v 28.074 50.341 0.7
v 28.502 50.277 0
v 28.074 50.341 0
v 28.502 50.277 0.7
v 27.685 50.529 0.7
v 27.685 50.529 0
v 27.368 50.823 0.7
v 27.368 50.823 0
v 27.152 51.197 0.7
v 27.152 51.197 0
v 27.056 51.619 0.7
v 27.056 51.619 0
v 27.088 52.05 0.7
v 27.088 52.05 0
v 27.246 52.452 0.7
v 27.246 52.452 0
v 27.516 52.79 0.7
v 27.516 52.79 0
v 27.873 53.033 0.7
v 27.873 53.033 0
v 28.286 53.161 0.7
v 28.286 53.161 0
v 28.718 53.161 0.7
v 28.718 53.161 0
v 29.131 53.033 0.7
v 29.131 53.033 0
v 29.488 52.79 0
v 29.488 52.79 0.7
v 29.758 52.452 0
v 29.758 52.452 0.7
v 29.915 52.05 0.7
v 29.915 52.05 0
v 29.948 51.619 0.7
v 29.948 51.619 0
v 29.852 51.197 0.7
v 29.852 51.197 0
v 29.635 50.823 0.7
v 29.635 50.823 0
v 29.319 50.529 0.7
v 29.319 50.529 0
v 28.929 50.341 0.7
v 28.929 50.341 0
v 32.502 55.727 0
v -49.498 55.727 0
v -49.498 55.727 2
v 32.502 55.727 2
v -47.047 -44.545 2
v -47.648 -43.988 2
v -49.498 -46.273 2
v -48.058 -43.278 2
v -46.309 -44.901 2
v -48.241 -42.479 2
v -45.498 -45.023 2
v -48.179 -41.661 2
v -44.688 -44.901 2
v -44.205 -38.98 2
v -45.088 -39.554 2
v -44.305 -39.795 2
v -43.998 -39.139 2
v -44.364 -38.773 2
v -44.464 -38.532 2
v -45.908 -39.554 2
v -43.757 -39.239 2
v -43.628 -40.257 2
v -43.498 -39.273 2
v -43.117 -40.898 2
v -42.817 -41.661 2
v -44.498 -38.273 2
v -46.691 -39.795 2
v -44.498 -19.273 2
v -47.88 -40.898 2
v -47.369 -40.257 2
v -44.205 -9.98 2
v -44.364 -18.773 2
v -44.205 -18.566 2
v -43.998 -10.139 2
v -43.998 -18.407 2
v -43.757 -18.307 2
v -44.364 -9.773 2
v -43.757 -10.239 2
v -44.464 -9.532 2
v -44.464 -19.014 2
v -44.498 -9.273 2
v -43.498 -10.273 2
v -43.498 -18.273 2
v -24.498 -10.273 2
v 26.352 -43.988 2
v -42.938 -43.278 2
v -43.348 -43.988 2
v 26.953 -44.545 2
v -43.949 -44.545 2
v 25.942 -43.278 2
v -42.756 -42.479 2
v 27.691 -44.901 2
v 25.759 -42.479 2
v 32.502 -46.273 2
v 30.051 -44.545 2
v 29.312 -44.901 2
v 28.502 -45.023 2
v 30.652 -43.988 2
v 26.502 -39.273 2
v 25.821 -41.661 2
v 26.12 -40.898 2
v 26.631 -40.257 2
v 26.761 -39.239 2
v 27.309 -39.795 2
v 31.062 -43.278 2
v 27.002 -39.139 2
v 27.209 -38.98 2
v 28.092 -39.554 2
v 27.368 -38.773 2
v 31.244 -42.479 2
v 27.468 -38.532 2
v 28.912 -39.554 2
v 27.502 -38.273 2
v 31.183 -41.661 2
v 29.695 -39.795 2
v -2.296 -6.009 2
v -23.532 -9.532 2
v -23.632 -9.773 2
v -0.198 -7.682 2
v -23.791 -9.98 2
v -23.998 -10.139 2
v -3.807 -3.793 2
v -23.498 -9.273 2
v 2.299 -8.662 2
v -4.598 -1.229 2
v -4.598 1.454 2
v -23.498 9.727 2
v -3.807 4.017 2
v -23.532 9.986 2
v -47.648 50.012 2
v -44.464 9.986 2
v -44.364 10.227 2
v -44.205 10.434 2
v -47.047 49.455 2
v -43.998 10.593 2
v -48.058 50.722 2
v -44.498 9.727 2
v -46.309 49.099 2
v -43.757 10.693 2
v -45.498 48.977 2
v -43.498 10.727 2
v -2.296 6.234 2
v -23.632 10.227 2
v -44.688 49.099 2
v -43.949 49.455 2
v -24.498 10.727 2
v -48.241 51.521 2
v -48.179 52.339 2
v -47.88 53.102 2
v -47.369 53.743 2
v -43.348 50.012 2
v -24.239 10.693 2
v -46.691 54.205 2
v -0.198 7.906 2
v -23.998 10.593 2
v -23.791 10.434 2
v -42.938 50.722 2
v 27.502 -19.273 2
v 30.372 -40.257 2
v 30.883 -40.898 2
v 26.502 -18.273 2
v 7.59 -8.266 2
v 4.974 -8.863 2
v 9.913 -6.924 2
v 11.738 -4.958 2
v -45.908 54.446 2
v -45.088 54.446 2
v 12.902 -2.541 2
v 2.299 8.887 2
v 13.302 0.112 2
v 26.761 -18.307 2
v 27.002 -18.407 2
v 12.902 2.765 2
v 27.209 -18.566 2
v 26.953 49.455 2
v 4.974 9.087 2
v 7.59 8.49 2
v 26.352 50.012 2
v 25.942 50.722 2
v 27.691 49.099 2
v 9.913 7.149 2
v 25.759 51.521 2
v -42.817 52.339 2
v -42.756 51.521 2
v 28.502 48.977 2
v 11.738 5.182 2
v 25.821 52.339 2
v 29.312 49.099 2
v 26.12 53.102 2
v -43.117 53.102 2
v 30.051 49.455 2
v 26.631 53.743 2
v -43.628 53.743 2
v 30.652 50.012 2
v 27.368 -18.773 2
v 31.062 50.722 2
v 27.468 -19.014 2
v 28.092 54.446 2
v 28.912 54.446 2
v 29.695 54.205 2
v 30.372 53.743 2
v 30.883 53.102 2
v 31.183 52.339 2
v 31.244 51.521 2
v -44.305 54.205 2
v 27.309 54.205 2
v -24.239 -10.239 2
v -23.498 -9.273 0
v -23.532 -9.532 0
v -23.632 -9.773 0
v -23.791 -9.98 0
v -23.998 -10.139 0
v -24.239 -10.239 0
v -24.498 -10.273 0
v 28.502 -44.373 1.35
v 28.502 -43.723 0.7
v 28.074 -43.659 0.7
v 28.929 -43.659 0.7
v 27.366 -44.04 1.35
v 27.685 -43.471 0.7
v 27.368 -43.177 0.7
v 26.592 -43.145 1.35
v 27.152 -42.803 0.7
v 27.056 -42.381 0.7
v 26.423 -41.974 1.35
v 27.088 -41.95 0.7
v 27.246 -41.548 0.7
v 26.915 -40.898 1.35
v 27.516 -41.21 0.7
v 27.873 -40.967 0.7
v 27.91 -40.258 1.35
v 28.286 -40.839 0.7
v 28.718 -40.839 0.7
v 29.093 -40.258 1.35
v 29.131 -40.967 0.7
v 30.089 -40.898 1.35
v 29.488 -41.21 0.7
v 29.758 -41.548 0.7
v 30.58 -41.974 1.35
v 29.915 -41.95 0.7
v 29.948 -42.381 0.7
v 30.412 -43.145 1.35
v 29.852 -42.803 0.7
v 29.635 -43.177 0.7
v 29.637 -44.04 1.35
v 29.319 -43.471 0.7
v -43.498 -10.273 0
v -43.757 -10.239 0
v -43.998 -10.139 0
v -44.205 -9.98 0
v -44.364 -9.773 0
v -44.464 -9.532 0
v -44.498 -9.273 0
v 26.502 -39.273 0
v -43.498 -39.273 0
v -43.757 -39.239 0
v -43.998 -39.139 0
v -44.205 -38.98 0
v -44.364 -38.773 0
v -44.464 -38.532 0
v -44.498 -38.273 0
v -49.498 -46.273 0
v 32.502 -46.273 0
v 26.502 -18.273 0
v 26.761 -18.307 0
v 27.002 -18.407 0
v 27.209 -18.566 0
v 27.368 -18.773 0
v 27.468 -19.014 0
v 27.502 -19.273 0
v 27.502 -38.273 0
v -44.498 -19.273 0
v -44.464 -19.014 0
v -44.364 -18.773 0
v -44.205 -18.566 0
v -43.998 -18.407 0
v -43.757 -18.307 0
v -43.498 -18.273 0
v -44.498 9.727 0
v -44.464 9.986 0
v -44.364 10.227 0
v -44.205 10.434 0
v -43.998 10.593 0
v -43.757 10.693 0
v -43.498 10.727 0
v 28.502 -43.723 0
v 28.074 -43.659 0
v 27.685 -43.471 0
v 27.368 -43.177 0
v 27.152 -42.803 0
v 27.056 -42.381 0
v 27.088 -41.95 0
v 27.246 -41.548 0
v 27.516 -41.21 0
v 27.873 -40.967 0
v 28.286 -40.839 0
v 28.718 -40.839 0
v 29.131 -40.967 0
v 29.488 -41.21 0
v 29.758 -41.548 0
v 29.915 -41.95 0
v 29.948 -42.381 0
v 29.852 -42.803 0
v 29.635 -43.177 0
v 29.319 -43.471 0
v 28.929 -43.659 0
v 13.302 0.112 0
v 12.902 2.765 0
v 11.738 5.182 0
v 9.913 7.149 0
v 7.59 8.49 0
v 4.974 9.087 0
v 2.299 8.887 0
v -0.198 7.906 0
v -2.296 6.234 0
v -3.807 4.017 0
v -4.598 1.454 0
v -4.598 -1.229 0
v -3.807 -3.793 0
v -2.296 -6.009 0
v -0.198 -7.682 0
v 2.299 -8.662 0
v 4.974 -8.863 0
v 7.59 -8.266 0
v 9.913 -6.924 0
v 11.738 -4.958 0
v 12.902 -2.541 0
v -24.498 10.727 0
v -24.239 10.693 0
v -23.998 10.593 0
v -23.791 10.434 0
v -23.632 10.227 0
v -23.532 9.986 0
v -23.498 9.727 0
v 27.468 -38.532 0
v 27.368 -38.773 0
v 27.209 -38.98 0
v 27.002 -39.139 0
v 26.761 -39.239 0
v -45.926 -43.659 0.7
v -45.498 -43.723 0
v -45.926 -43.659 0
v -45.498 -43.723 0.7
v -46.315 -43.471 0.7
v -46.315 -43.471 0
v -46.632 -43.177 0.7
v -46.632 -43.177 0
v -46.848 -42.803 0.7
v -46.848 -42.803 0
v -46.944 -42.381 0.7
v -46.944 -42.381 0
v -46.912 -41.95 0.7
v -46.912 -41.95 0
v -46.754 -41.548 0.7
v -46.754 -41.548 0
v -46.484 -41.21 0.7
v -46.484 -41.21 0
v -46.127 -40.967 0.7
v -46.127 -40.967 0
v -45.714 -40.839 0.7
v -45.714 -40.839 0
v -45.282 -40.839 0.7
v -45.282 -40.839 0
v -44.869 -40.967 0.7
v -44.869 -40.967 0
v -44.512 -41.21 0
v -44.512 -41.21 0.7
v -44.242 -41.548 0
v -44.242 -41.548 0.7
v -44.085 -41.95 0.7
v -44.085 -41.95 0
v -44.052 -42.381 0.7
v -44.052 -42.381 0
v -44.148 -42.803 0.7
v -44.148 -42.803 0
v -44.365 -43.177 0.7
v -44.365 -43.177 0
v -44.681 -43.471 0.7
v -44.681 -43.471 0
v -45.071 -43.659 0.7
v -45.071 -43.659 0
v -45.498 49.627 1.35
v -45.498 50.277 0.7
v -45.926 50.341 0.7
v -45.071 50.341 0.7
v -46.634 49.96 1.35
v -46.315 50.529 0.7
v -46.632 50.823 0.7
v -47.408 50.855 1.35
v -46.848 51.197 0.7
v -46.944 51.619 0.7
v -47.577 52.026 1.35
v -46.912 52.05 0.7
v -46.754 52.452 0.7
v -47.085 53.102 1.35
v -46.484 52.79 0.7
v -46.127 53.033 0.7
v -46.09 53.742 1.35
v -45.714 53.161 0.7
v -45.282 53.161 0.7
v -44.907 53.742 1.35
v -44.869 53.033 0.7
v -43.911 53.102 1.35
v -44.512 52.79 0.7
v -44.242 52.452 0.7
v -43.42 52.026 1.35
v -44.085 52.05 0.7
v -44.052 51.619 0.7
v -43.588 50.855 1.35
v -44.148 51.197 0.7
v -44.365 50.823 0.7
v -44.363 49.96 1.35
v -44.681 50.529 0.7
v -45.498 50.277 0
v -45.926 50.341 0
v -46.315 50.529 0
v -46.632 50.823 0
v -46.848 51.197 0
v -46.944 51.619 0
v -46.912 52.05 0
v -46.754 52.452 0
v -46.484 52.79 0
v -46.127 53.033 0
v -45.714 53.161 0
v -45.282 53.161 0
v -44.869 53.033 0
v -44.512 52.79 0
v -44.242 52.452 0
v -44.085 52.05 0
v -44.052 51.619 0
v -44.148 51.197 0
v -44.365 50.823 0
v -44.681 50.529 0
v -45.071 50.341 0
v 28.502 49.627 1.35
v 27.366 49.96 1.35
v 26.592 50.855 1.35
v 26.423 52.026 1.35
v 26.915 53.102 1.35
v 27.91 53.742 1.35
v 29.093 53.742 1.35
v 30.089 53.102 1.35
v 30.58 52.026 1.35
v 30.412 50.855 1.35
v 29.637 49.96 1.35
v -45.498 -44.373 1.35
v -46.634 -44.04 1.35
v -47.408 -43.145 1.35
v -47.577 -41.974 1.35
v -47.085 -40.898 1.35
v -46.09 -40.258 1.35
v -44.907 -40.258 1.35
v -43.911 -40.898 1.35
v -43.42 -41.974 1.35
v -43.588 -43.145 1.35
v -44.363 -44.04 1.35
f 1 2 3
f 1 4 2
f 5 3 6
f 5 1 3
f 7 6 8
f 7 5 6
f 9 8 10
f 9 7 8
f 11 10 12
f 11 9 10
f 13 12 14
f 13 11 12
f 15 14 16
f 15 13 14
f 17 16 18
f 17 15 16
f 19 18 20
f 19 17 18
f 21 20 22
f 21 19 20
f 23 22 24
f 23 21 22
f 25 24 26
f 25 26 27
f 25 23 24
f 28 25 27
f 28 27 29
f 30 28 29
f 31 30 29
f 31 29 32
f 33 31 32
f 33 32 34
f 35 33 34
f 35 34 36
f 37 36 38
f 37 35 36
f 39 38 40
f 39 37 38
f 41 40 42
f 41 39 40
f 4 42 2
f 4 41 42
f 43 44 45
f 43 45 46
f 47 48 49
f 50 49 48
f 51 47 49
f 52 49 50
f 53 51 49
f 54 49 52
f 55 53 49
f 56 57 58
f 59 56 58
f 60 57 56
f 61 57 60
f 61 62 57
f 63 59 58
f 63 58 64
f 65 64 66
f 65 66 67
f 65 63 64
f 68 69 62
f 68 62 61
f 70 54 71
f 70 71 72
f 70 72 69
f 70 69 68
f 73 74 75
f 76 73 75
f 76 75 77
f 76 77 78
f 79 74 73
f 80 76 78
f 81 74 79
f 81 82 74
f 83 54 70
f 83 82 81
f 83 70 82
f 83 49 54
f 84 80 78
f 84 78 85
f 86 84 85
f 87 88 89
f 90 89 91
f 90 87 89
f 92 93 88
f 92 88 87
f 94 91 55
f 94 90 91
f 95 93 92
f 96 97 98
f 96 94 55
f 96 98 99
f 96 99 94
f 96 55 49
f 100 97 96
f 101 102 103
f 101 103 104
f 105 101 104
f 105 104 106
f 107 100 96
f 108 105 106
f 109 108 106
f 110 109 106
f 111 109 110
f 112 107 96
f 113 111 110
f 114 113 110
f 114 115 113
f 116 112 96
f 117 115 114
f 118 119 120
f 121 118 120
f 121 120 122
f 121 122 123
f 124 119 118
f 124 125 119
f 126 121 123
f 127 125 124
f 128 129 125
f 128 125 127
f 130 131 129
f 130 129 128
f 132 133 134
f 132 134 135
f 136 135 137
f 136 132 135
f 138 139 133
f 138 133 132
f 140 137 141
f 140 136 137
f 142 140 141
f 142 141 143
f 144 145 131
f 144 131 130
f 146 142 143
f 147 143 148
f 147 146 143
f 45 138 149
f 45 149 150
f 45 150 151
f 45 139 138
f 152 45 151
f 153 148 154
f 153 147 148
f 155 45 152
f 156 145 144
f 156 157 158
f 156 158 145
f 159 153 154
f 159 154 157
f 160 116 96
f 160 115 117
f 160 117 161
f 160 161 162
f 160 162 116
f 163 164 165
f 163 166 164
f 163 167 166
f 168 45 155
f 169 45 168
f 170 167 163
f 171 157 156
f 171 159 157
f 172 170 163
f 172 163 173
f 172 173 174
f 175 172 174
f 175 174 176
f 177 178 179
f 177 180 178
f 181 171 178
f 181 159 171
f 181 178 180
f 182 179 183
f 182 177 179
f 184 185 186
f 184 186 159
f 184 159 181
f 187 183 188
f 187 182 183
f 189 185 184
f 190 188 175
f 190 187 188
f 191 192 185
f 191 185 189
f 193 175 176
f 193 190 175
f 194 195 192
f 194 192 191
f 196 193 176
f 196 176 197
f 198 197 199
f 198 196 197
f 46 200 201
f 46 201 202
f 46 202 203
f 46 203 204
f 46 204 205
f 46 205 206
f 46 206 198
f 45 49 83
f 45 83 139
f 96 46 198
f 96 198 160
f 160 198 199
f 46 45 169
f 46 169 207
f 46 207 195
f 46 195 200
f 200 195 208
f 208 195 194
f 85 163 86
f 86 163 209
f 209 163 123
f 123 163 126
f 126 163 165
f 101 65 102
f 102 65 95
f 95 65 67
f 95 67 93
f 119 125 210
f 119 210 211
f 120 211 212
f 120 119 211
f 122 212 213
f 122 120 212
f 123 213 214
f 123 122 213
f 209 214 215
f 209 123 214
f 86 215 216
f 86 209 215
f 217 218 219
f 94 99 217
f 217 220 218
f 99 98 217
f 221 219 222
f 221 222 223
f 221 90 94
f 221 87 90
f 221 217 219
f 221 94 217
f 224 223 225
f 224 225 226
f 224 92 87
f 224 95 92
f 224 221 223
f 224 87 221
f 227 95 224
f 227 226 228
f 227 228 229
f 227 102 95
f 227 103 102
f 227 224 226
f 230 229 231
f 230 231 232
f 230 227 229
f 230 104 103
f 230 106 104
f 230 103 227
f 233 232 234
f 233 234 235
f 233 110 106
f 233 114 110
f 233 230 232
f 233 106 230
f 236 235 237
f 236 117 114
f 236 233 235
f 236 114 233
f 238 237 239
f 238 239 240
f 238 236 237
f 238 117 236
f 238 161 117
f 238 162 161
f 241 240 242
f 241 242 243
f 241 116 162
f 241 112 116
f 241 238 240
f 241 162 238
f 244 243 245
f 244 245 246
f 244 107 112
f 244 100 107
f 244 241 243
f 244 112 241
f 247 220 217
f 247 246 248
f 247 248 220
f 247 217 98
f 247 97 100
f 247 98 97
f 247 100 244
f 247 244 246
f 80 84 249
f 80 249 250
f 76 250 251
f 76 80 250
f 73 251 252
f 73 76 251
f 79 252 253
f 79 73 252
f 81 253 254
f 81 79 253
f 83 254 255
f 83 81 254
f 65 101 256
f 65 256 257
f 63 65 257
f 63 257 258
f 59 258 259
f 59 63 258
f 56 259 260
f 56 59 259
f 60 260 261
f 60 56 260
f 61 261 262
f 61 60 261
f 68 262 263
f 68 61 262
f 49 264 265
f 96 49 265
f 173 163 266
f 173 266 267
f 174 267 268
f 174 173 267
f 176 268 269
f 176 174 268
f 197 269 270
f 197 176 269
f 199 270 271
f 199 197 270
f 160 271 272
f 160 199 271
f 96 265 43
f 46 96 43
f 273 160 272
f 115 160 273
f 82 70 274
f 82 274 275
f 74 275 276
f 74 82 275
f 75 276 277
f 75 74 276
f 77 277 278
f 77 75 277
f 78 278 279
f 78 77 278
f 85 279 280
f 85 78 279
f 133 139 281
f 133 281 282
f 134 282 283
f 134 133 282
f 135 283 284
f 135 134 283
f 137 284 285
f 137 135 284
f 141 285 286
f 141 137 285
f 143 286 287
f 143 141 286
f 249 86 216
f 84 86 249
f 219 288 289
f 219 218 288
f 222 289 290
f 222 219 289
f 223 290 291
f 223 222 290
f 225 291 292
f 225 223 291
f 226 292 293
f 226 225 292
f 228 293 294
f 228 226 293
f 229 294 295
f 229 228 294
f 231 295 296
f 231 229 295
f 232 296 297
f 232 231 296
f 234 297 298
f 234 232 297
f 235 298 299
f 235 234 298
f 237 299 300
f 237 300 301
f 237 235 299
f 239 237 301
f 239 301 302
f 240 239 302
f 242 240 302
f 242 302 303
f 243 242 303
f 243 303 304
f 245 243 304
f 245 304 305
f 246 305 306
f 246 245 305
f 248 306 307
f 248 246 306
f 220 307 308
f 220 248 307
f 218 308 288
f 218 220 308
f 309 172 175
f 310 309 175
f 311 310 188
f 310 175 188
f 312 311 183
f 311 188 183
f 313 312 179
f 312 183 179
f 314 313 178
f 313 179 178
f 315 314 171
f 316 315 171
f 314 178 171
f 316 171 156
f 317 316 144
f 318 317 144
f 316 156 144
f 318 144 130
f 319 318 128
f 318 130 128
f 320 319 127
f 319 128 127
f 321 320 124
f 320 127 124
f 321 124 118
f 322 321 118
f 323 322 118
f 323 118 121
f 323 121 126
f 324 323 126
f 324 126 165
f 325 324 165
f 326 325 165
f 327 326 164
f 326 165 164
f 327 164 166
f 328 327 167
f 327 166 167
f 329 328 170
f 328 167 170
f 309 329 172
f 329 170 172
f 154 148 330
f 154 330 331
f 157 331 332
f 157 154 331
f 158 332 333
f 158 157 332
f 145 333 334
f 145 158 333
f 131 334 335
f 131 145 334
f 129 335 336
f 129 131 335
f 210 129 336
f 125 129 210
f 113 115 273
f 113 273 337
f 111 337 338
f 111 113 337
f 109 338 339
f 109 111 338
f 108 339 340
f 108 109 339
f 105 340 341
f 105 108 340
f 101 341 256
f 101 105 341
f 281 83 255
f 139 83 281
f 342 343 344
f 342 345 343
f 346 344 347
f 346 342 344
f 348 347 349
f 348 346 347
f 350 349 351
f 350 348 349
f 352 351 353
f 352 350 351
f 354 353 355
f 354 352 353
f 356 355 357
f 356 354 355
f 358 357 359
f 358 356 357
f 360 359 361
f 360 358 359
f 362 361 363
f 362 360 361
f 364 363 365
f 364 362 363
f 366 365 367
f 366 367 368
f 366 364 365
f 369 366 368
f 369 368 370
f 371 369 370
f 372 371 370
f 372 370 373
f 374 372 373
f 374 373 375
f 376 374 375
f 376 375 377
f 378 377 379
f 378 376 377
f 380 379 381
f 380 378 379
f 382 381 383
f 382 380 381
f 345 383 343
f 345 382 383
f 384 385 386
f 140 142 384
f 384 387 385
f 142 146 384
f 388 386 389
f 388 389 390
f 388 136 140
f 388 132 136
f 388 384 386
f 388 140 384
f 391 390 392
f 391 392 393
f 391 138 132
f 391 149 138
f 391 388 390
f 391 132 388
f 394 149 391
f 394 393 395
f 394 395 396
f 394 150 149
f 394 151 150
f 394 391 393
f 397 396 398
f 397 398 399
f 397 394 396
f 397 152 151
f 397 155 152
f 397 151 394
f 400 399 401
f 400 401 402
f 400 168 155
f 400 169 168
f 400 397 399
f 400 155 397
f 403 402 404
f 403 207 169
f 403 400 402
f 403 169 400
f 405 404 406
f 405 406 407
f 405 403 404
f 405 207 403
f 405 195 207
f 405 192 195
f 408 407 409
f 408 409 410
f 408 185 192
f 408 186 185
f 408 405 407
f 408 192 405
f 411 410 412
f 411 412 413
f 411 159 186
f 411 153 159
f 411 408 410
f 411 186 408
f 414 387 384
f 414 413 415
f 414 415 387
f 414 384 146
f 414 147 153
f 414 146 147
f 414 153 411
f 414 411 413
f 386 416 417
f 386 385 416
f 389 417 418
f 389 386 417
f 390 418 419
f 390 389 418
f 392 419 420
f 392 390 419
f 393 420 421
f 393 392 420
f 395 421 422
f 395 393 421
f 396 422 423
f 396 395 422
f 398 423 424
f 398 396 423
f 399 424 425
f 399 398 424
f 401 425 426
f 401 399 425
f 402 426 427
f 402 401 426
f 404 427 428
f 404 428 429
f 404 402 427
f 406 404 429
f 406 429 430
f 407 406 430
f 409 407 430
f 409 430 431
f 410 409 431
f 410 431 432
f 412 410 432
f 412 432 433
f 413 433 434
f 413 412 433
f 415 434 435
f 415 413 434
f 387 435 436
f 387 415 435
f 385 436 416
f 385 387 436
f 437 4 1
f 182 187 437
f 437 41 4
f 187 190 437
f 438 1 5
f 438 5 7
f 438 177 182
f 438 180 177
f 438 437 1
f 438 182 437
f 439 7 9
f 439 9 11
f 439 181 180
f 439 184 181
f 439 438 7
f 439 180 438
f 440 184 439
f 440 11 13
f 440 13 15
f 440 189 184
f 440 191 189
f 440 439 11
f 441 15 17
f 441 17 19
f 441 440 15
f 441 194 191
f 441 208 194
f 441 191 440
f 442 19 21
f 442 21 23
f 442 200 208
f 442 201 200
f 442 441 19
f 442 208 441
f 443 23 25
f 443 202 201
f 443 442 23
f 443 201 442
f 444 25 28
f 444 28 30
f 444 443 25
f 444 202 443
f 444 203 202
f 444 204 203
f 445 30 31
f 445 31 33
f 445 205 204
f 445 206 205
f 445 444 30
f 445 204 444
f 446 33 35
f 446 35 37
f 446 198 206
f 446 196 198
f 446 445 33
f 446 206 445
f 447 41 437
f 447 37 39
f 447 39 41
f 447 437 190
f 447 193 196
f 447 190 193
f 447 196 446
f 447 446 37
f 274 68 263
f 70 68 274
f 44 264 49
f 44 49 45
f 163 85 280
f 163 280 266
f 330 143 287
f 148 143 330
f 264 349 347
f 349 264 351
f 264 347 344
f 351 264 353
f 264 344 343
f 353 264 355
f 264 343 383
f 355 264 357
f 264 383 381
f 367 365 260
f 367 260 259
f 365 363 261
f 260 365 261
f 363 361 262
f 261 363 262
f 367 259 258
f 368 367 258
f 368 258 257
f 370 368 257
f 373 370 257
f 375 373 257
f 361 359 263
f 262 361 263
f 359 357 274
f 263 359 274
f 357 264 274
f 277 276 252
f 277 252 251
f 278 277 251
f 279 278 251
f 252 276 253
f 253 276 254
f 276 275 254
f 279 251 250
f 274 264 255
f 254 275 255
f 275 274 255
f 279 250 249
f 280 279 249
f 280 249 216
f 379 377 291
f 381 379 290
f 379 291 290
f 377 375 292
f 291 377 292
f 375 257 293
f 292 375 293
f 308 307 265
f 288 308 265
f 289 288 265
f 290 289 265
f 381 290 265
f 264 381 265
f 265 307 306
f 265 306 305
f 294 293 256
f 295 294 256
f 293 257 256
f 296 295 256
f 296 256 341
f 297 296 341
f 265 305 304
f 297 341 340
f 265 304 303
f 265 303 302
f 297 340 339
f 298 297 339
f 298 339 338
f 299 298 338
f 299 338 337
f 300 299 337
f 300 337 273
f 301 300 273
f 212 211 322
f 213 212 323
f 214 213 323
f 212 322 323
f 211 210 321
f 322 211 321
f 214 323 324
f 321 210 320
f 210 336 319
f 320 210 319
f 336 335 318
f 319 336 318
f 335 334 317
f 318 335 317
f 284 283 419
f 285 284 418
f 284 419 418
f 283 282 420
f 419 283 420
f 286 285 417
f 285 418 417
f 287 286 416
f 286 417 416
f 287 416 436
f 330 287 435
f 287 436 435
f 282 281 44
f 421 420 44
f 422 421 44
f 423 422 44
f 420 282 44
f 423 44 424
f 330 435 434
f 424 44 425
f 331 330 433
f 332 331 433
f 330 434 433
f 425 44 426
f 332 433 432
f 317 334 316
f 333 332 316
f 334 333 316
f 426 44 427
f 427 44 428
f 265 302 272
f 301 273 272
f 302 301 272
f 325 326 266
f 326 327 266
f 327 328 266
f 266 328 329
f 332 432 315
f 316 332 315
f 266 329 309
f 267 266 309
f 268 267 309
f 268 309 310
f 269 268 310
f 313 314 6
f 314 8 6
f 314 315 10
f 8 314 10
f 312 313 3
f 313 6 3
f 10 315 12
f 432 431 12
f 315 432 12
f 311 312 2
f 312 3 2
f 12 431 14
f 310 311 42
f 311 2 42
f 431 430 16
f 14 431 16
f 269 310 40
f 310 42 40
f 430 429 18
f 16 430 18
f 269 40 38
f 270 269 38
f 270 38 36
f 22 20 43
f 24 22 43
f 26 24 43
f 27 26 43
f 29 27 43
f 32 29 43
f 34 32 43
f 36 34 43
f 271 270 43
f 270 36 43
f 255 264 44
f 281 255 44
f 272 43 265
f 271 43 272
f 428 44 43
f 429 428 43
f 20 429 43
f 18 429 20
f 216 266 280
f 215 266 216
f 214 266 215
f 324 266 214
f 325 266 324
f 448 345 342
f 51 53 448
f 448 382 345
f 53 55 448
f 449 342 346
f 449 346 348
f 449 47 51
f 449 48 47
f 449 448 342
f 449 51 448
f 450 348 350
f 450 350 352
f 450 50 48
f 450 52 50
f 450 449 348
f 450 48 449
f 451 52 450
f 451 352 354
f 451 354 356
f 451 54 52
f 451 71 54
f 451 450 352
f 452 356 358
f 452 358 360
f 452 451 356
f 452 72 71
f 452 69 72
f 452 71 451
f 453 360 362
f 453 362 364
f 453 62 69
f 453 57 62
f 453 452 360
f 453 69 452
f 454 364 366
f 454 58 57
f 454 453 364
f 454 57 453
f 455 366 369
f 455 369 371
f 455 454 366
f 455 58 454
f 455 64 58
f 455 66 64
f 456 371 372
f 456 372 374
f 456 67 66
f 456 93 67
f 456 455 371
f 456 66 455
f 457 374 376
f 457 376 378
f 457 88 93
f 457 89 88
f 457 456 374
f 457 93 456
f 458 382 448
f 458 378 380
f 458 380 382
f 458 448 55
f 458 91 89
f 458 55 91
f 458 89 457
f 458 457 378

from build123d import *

# Parameters (mm, degrees)
SKETCH1_W                                    = 82
SKETCH1_H                                    = 102
BOSS_EXTRUDE1_DEPTH                          = 2
SKETCH2_R                                    = 9
CUT_EXTRUDE2_DEPTH                           = 2
CSK_FOR_M2_5_COUNTERSUNK_FLAT_HEAD_S_2_COUNT = 2
CSK_FOR_M2_5_COUNTERSUNK_FLAT_HEAD_S_2_PITCH = 94
CSK_FOR_M2_5_COUNTERSUNK_FLAT_HEAD_S_3_COUNT = 2
CSK_FOR_M2_5_COUNTERSUNK_FLAT_HEAD_S_3_PITCH = 119.63277143
CSK_FOR_M2_5_COUNTERSUNK_FLAT_HEAD_S_4_COUNT = 2
CSK_FOR_M2_5_COUNTERSUNK_FLAT_HEAD_S_4_PITCH = 74


with BuildPart() as part:
    # Sketch1 → Boss-Extrude1 (new body)
    with BuildSketch(Plane.XY):
        with Locations((-8.498222994, 4.726902457)):
            Rectangle(SKETCH1_W, SKETCH1_H)
    extrude(amount=BOSS_EXTRUDE1_DEPTH)

    # Sketch2 → Cut-Extrude2 (cut)
    with BuildSketch(Plane.XY.offset(2)):
        with Locations((4.301781638, 0.112195324)):
            Circle(SKETCH2_R)
        with BuildLine():
            Line((-43.498222994, -18.273097543), (26.501777006, -18.273097543))
            ThreePointArc((26.501777006, -18.273097543), (27.208883787, -18.565990762), (27.501777006, -19.273097543))
            Line((27.501777006, -19.273097543), (27.501777006, -38.273097543))
            ThreePointArc((27.501777006, -38.273097543), (27.208883787, -38.980204324), (26.501777006, -39.273097543))
            Line((26.501777006, -39.273097543), (-43.498222994, -39.273097543))
            ThreePointArc((-43.498222994, -39.273097543), (-44.205329775, -38.980204324), (-44.498222994, -38.273097543))
            Line((-44.498222994, -38.273097543), (-44.498222994, -19.273097543))
            ThreePointArc((-44.498222994, -19.273097543), (-44.205329775, -18.565990762), (-43.498222994, -18.273097543))
        make_face()
        with BuildLine():
            Line((-43.498222994, 10.726902457), (-24.498222994, 10.726902457))
            ThreePointArc((-24.498222994, 10.726902457), (-23.791116213, 10.434009238), (-23.498222994, 9.726902457))
            Line((-23.498222994, 9.726902457), (-23.498222994, -9.273097543))
            ThreePointArc((-23.498222994, -9.273097543), (-23.791116213, -9.980204324), (-24.498222994, -10.273097543))
            Line((-24.498222994, -10.273097543), (-43.498222994, -10.273097543))
            ThreePointArc((-43.498222994, -10.273097543), (-44.205329775, -9.980204324), (-44.498222994, -9.273097543))
            Line((-44.498222994, -9.273097543), (-44.498222994, 9.726902457))
            ThreePointArc((-44.498222994, 9.726902457), (-44.205329775, 10.434009238), (-43.498222994, 10.726902457))
        make_face()
    extrude(amount=-CUT_EXTRUDE2_DEPTH, mode=Mode.SUBTRACT)

    # Sketch18 → CSK for M2.5 Countersunk Flat Head Screw2 (revolve, cut)
    with BuildSketch(Plane(origin=(-45.498222994, 51.726902457, 2), x_dir=(0, -1, 0), z_dir=(1, 0, 0))):
        Polygon((0, 0), (0, 2), (1.45, 2), (1.45, 1.3), (2.75, 0), align=None)
    csk_for_m2_5_countersunk_flat_head_screw = revolve(axis=Axis((-45.498222994, 51.726902457, 8.35), (0, 0, -1)), mode=Mode.SUBTRACT)

    # CSK for M2.5 Countersunk Flat Head S 2: CSK for M2.5 Countersunk Flat Head Screw2 ×2
    with Locations(*[(0, -i * CSK_FOR_M2_5_COUNTERSUNK_FLAT_HEAD_S_2_PITCH, 0) for i in range(1, CSK_FOR_M2_5_COUNTERSUNK_FLAT_HEAD_S_2_COUNT)]):
        add(csk_for_m2_5_countersunk_flat_head_screw, mode=Mode.SUBTRACT)

    # CSK for M2.5 Countersunk Flat Head S 3: CSK for M2.5 Countersunk Flat Head Screw2 ×2
    with Locations(*[Vector(0.618559606, -0.785737878, 0) * (i * CSK_FOR_M2_5_COUNTERSUNK_FLAT_HEAD_S_3_PITCH) for i in range(1, CSK_FOR_M2_5_COUNTERSUNK_FLAT_HEAD_S_3_COUNT)]):
        add(csk_for_m2_5_countersunk_flat_head_screw, mode=Mode.SUBTRACT)

    # CSK for M2.5 Countersunk Flat Head S 4: CSK for M2.5 Countersunk Flat Head Screw2 ×2
    with Locations(*[(i * CSK_FOR_M2_5_COUNTERSUNK_FLAT_HEAD_S_4_PITCH, 0, 0) for i in range(1, CSK_FOR_M2_5_COUNTERSUNK_FLAT_HEAD_S_4_COUNT)]):
        add(csk_for_m2_5_countersunk_flat_head_screw, mode=Mode.SUBTRACT)


solid = part.part
